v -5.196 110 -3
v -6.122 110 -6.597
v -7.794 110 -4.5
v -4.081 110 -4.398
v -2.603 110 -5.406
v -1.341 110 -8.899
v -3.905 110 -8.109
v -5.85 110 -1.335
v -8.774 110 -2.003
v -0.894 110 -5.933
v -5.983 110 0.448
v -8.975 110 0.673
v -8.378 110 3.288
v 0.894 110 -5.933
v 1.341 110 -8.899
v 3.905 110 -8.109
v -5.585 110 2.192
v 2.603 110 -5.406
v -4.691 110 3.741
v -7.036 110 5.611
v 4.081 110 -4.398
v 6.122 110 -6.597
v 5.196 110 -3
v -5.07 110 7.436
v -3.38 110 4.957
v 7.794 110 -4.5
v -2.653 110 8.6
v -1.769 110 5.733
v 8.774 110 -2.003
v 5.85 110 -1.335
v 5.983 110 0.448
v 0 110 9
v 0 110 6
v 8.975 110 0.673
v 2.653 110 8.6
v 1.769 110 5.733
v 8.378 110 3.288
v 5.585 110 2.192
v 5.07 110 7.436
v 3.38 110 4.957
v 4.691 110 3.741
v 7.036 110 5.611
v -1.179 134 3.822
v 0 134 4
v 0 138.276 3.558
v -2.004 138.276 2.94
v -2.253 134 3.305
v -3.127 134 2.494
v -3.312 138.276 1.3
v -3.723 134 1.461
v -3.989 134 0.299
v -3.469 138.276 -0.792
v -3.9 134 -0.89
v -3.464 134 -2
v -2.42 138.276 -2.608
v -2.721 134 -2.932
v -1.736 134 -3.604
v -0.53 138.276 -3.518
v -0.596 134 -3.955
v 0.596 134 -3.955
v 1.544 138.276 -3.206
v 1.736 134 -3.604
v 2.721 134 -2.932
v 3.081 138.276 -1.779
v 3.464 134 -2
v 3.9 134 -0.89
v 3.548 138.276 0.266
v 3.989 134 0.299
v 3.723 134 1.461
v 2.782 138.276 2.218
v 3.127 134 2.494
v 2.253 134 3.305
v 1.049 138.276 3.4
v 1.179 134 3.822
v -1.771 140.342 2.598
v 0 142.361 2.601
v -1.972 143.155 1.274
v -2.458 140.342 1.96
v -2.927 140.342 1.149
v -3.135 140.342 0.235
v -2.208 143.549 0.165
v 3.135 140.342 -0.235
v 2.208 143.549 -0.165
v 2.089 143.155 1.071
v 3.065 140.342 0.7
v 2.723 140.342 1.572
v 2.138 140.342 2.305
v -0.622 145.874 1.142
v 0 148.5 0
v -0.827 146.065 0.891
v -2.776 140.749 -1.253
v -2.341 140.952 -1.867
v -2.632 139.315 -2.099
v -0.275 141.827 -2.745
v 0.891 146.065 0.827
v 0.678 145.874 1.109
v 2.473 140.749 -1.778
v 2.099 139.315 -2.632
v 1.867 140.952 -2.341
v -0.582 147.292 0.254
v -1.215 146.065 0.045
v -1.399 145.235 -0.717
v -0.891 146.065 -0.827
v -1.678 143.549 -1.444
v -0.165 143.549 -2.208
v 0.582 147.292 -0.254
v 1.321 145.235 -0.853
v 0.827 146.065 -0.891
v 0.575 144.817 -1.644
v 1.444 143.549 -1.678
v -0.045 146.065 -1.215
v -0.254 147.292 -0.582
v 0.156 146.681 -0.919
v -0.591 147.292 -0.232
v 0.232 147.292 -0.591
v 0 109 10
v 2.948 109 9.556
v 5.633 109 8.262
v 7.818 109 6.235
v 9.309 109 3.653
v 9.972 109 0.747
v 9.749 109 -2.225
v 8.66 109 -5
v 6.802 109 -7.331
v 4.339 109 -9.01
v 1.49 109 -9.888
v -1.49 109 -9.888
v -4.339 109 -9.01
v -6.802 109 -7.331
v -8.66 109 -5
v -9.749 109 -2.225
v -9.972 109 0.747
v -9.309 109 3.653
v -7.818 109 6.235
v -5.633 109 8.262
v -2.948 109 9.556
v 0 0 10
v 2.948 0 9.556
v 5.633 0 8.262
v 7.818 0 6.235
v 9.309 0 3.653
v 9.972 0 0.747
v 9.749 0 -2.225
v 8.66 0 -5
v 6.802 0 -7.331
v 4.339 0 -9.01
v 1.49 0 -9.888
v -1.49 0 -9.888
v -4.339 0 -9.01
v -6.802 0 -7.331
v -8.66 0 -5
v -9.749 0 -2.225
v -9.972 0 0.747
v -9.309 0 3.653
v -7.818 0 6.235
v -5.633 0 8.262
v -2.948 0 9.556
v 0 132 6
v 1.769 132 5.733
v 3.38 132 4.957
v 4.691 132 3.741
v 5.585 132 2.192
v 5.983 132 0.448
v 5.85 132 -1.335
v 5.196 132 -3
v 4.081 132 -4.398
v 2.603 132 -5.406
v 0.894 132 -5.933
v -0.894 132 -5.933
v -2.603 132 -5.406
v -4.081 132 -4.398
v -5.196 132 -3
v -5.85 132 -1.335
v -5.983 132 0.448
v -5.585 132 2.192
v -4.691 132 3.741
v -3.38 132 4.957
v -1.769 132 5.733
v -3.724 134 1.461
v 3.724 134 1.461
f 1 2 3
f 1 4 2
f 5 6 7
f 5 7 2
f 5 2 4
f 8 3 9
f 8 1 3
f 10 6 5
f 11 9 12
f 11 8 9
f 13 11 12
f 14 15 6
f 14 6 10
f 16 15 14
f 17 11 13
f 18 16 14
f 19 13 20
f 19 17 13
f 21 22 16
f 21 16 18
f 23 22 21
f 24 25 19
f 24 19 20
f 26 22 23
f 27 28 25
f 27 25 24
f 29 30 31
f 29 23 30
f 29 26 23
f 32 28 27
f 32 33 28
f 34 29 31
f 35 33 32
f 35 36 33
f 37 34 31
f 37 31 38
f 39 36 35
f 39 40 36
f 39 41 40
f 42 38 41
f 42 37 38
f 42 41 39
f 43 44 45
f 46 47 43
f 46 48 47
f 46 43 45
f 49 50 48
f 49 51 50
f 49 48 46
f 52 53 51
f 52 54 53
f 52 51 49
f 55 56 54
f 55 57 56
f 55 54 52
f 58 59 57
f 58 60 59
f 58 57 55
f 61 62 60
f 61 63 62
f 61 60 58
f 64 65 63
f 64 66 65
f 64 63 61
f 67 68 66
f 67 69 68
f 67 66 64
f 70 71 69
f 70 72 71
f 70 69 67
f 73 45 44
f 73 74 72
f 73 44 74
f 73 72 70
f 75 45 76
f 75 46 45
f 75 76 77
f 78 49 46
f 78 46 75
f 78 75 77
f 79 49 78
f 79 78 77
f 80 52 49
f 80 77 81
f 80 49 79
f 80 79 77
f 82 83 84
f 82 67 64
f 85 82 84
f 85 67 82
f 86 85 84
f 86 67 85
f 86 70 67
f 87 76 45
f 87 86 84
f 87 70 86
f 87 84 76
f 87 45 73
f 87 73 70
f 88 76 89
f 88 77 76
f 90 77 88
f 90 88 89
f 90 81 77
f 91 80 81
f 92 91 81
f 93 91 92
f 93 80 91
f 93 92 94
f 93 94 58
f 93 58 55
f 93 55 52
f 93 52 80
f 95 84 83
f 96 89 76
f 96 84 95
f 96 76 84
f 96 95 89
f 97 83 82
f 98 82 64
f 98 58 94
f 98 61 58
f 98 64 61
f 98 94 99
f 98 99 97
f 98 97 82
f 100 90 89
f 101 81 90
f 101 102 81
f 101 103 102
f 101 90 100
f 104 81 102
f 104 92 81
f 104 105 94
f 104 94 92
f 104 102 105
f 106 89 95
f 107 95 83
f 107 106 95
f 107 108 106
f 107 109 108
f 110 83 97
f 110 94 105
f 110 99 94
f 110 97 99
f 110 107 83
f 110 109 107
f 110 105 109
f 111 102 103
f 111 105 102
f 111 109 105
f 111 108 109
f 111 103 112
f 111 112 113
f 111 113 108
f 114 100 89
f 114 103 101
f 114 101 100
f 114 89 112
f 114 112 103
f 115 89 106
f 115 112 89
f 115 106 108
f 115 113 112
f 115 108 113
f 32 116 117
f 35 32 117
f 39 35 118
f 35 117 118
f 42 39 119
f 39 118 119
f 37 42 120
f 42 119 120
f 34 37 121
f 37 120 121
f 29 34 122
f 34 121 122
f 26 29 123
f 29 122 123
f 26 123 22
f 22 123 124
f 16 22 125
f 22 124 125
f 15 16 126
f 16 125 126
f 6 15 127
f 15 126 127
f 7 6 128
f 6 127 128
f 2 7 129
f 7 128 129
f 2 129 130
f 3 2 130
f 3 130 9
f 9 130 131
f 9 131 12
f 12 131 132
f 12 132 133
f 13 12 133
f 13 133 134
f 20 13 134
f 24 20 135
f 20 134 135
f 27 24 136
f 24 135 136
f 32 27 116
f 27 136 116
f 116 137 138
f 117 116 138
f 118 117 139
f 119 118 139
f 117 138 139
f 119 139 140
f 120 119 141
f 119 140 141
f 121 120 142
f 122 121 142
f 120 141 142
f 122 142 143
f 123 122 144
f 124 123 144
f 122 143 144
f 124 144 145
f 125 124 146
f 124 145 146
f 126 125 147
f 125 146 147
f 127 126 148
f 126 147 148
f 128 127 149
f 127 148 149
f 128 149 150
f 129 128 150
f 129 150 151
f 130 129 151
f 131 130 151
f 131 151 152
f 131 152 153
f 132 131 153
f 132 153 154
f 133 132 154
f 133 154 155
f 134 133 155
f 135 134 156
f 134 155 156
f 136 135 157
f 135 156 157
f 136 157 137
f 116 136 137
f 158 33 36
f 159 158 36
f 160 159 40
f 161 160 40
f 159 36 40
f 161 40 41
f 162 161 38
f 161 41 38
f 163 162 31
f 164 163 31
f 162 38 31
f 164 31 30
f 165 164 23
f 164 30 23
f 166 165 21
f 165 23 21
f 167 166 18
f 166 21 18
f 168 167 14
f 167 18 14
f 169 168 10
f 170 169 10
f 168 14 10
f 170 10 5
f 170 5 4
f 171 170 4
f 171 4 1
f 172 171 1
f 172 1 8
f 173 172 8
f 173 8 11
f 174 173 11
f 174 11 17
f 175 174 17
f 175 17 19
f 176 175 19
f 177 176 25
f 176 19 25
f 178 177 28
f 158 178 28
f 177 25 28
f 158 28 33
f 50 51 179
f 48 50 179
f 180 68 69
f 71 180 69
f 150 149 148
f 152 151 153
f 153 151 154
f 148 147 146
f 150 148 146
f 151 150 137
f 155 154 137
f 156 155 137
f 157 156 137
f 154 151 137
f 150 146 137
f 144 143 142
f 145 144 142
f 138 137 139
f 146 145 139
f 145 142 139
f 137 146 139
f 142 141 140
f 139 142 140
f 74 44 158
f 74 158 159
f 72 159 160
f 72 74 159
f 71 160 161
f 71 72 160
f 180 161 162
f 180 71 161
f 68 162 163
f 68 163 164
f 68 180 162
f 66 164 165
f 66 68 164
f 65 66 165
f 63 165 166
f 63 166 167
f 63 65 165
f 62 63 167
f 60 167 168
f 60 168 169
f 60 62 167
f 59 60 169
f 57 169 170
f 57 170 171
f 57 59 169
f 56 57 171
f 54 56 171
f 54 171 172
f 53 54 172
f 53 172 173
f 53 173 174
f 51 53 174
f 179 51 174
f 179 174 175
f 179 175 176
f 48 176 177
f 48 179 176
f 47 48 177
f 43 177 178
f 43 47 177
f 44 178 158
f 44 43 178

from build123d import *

# Parameters (mm, degrees)
SKETCH1_R           = 10
BOSS_EXTRUDE1_DEPTH = 110
SKETCH2_R           = 6
BOSS_EXTRUDE2_DEPTH = 24
CHAMFER1_SIZE       = 2
CHAMFER2_SIZE       = 1


with BuildPart() as part:
    # Sketch1 → Boss-Extrude1 (new body)
    with BuildSketch(Plane(origin=(0, 0, 0), x_dir=(1, 0, 0), z_dir=(0, 1, 0))):
        with Locations(Location((0, 0, 0), (0, 0, 270))):
            Circle(SKETCH1_R)
    extrude(amount=BOSS_EXTRUDE1_DEPTH)

    # Sketch2 → Boss-Extrude2 (add)
    with BuildSketch(Plane(origin=(0, 110, 0), x_dir=(1, 0, 0), z_dir=(0, 1, 0))):
        with Locations(Location((0, 0, 0), (0, 0, 270))):
            Circle(SKETCH2_R)
    extrude(amount=BOSS_EXTRUDE2_DEPTH)

    # Sketch3 → Revolve1 (revolve)
    with BuildSketch(Plane(origin=(0, 0, 0), x_dir=(0, 0, -1), z_dir=(1, 0, 0))):
        with BuildLine():
            Line((0, 134), (0, 148.5))
            add(Edge.make_bspline(
                [(0, 148.5), (-3.667360113, 141.867546182), (-4, 134)],
                knots=[0, 0, 0, 1, 1, 1], degree=2))
            Line((-4, 134), (0, 134))
        make_face()
    revolve(axis=Axis((0, 134, 0), (0, -1, 0)))

    # Chamfer1
    chamfer1_edges = [part.edges().sort_by_distance(p)[0] for p in [
        (0, 134, -6),
    ]]
    chamfer(chamfer1_edges, length=CHAMFER1_SIZE - 0.0001)  # a hair under: the kernel refuses the full size

    # Chamfer2
    chamfer2_edges = [part.edges().sort_by_distance(p)[0] for p in [
        (0, 110, -10),
    ]]
    chamfer(chamfer2_edges, length=CHAMFER2_SIZE)


solid = part.part
